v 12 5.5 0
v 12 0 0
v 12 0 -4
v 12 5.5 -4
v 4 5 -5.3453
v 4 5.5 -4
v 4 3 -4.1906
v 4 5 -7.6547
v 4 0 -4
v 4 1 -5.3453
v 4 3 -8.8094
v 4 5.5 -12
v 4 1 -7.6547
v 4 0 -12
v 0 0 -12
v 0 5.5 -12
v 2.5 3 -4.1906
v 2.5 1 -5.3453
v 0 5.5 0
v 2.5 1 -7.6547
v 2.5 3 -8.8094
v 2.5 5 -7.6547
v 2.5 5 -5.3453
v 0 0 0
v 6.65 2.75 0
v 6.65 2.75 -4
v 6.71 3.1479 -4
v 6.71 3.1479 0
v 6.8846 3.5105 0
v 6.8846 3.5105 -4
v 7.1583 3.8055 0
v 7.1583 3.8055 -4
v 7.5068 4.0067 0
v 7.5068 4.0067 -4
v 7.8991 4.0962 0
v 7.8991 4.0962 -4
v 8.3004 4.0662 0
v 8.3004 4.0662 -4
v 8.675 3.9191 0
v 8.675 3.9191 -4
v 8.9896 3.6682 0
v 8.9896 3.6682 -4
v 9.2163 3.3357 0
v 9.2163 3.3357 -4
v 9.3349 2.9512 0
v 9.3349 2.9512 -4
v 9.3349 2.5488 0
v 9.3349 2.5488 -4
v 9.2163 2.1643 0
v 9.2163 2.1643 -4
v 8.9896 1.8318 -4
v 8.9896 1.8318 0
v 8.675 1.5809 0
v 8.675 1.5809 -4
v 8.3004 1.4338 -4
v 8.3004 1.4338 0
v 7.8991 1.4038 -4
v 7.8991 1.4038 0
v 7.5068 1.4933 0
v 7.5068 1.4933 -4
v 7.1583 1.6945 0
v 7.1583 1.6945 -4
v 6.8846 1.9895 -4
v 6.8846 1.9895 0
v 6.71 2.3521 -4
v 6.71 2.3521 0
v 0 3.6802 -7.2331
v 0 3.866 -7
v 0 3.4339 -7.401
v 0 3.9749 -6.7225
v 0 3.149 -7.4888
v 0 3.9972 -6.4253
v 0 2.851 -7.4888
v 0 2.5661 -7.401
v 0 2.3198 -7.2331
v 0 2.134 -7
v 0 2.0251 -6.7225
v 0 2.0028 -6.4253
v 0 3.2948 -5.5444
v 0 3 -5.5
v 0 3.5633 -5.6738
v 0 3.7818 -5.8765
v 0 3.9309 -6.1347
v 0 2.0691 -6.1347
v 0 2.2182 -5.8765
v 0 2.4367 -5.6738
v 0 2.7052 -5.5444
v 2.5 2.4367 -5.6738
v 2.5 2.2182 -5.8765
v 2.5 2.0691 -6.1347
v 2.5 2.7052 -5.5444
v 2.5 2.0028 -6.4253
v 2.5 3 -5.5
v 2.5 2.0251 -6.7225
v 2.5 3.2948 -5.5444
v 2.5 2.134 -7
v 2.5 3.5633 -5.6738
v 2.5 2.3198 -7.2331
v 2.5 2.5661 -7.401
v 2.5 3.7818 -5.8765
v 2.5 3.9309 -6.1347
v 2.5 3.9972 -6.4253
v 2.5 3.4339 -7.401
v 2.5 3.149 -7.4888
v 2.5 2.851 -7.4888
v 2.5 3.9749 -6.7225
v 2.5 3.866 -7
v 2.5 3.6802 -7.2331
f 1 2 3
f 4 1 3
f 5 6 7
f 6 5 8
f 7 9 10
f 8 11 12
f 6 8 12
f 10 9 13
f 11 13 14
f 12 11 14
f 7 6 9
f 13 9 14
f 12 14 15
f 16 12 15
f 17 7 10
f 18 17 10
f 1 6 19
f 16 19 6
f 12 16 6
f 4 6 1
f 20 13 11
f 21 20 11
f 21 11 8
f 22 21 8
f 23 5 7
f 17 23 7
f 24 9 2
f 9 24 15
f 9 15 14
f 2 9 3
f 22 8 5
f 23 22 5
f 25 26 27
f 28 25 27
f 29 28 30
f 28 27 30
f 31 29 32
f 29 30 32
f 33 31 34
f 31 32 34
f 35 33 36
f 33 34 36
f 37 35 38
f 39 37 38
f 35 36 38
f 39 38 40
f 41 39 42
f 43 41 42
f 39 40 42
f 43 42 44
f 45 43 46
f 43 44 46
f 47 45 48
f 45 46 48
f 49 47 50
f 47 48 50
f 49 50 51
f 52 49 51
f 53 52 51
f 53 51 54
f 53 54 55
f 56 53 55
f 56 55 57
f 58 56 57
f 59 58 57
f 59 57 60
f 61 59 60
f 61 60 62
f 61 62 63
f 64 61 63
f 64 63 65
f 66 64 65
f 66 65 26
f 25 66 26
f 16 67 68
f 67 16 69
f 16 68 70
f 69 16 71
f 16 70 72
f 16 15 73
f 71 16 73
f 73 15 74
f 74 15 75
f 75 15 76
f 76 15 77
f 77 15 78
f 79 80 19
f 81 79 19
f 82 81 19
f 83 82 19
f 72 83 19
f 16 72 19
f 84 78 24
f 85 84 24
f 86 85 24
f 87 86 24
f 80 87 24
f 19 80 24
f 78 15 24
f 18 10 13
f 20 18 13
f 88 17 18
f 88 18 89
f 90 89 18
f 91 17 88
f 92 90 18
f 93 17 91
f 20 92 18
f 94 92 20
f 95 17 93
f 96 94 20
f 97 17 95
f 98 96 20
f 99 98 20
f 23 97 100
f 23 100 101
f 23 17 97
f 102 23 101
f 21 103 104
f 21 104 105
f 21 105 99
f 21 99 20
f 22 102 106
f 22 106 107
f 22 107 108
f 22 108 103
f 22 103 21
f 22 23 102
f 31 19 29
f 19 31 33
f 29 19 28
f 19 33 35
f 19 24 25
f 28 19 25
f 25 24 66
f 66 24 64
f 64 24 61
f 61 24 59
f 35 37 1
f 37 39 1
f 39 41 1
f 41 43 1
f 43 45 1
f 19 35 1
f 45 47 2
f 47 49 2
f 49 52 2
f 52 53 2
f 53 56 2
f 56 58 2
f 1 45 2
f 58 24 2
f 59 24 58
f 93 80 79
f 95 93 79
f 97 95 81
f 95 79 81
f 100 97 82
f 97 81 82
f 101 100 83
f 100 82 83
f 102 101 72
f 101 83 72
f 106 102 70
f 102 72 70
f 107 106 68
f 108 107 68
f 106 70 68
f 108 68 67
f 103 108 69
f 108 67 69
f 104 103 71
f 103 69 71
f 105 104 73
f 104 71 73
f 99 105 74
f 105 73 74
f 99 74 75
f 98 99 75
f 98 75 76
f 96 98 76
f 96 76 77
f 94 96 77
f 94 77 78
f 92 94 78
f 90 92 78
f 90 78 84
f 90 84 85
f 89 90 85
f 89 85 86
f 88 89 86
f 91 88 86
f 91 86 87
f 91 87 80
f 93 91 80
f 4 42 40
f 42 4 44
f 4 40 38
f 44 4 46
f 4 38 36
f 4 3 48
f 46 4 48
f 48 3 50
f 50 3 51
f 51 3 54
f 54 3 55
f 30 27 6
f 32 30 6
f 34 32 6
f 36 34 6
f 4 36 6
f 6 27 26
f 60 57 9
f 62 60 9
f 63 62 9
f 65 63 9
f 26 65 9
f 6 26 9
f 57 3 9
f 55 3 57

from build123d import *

# Parameters (mm, degrees)
EXTRUDE_1_DEPTH     = 5.5
CUT_EXTRUDE_1_REACH = 19.84
SKETCH_2_R          = 1
CUT_EXTRUDE_2_DEPTH = 1.5
CUT_EXTRUDE_3_REACH = 17.435
SKETCH_4_R          = 1.35


with BuildPart() as part:
    # 草图1 → 凸台-拉伸1 (new body)
    with BuildSketch(Plane(origin=(0, 0, 0), x_dir=(1, 0, 0), z_dir=(0, 1, 0))):
        Polygon((0, 0), (12, 0), (12, 4), (4, 4), (4, 12), (0, 12), align=None)
    extrude(amount=EXTRUDE_1_DEPTH)

    # 草图2 → 切除-拉伸1 (cut, up to next)
    with BuildSketch(Plane.ZY, mode=Mode.PRIVATE) as cut_extrude_1_sk1:
        with Locations((-6.5, 3)):
            Circle(SKETCH_2_R)
    cut_extrude_1_tool1 = extrude(cut_extrude_1_sk1.sketch, amount=-CUT_EXTRUDE_1_REACH, mode=Mode.PRIVATE) & part.part
    add(cut_extrude_1_tool1.solids().sort_by_distance((0, 3, -6.5))[0], mode=Mode.SUBTRACT)

    # 草图3 → 切除-拉伸2 (cut)
    with BuildSketch(Plane(origin=(4, 0, 0), x_dir=(0, 0, -1), z_dir=(1, 0, 0))):
        Polygon((8.809401077, 3), (7.654700538, 5), (5.345299462, 5), (4.190598923, 3), (5.345299462, 1), (7.654700538, 1), align=None)
    extrude(amount=-CUT_EXTRUDE_2_DEPTH, mode=Mode.SUBTRACT)

    # 草图4 → 切除-拉伸3 (cut, up to next)
    with BuildSketch(Plane(origin=(0, 0, -4), x_dir=(-1, 0, 0), z_dir=(0, 0, -1)), mode=Mode.PRIVATE) as cut_extrude_3_sk1:
        with Locations((-8, 2.75)):
            Circle(SKETCH_4_R)
    cut_extrude_3_tool1 = extrude(cut_extrude_3_sk1.sketch, amount=-CUT_EXTRUDE_3_REACH, mode=Mode.PRIVATE) & part.part
    add(cut_extrude_3_tool1.solids().sort_by_distance((8, 2.75, -4))[0], mode=Mode.SUBTRACT)


solid = part.part
